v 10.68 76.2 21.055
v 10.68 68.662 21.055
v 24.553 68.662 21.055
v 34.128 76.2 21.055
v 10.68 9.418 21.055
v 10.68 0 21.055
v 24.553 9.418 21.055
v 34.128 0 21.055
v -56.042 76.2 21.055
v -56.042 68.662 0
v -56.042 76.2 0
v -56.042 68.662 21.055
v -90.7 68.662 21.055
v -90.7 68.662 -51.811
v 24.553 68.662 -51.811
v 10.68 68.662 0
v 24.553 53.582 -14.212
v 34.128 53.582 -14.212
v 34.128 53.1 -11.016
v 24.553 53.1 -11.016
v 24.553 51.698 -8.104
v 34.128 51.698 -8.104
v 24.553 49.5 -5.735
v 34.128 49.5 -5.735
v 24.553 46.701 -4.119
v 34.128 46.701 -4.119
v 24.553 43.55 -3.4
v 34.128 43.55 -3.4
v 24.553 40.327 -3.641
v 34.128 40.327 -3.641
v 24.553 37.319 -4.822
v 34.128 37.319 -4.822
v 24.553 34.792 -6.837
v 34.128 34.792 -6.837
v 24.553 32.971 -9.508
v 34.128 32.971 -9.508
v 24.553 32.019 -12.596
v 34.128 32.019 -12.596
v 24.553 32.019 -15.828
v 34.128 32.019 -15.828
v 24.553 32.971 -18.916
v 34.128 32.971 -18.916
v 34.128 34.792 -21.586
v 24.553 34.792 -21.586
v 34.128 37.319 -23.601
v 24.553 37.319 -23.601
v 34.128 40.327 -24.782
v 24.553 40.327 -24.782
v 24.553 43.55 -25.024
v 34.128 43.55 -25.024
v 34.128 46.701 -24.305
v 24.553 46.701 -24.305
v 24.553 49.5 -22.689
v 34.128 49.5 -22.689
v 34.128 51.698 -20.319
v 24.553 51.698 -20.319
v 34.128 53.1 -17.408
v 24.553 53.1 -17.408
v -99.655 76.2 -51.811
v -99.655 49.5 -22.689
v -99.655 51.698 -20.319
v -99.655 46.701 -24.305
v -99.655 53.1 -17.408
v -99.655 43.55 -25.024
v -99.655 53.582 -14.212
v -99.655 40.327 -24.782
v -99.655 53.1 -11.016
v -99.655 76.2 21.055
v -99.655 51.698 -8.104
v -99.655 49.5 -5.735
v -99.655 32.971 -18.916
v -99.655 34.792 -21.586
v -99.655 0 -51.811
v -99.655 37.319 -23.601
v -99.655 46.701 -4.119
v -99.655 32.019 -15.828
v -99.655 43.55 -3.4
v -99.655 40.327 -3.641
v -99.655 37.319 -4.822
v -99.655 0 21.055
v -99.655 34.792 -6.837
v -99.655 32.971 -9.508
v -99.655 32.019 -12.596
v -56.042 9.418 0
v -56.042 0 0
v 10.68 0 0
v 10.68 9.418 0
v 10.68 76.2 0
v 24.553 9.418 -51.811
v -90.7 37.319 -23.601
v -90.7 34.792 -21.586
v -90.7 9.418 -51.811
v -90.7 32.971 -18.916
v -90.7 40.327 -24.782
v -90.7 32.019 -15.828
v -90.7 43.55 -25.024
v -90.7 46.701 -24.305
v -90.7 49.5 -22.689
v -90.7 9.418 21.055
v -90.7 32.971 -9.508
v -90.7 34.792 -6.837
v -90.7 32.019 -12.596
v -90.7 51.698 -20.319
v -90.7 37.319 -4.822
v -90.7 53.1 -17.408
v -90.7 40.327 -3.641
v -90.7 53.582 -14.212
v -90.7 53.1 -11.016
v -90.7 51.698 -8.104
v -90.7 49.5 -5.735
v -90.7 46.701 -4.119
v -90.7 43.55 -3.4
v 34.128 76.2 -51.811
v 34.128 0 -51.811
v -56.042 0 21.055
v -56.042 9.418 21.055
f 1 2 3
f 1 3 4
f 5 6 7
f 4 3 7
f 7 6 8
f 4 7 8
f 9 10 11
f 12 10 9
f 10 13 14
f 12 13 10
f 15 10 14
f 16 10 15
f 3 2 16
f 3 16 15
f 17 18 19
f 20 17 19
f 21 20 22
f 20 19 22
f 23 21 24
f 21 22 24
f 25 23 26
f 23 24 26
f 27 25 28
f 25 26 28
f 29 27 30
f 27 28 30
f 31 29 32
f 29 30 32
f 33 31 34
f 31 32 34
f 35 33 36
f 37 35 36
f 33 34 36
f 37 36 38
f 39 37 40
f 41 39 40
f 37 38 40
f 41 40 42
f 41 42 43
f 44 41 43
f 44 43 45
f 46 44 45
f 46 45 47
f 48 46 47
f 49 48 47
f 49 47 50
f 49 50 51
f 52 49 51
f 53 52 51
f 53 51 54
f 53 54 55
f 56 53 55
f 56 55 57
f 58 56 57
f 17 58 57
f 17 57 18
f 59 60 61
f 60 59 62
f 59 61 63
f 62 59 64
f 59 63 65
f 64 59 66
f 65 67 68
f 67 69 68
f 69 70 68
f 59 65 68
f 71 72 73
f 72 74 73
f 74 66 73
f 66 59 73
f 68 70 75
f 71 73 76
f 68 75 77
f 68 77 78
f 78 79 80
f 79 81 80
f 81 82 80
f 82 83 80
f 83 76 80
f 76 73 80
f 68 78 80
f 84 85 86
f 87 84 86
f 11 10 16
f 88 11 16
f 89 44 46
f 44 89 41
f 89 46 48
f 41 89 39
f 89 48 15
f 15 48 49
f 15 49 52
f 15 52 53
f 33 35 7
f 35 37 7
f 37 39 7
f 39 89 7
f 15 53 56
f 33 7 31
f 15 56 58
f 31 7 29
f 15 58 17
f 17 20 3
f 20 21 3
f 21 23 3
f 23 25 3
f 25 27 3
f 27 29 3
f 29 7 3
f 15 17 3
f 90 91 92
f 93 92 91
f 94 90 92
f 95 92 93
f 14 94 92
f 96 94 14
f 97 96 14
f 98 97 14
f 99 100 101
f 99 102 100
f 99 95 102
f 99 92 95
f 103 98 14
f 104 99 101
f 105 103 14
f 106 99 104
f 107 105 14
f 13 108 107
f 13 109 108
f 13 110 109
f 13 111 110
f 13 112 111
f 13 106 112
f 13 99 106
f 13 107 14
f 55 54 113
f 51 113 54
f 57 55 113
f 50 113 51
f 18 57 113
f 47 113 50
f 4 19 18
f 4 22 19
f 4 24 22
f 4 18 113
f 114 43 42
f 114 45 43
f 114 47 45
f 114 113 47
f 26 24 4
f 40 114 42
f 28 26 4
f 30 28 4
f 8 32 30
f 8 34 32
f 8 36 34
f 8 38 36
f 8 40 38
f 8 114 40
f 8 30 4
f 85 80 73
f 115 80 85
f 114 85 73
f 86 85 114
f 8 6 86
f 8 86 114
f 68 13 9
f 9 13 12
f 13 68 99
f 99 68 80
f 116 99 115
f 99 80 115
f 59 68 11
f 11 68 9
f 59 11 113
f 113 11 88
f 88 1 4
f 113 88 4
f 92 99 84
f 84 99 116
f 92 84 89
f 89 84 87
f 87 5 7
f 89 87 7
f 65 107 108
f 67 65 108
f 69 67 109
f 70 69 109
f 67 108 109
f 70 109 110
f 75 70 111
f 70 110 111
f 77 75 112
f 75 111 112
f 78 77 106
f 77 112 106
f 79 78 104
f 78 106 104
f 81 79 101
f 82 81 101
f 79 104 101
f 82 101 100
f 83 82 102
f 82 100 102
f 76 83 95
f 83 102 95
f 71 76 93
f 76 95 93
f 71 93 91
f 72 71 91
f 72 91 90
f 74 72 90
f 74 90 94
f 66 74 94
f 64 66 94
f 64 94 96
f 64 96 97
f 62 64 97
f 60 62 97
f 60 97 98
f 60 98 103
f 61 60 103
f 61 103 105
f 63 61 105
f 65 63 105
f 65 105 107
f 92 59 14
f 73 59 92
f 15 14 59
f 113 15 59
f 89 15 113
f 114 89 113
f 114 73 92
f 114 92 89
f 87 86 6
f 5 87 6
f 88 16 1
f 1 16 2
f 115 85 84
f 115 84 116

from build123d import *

# Parameters (mm, degrees)
F0_W     = 133.7834484875
F0_H     = 72.8662703186
F1_DEPTH = 76.2
F2_W     = 115.2523923665
F2_H     = 59.2436287552
F3_DEPTH = 72.8672703186
F4_R     = 10.8422221272
F5_DEPTH = 133.7844484875
F6_W     = 66.7222347111
F6_H     = 33.3499126136
F7_DEPTH = 76.201


with BuildPart() as f1:
    # F0 (on Front) → F1 (new body)
    with BuildSketch(Plane.XZ):
        with Locations((-32.7633004636, -15.3782842681)):
            Rectangle(F0_W, F0_H)
    extrude(amount=-F1_DEPTH)

    # F2 (on face) → F3 (cut, through all)
    with BuildSketch(Plane.XY.offset(21.0548508912)):
        with Locations((-33.0736329779, 39.0397785231)):
            Rectangle(F2_W, F2_H)
    extrude(amount=-F3_DEPTH, mode=Mode.SUBTRACT)

    # F4 (on face) → F5 (cut, through all)
    with BuildSketch(Plane.YZ.offset(34.1284237802)):
        with Locations((42.7399463952, -14.2118474469)):
            Circle(F4_R)
    extrude(amount=-F5_DEPTH, mode=Mode.SUBTRACT)

    # F6 (on face) → F7 (cut, through all)
    with BuildSketch(Plane.XZ):
        with Locations((-22.6808311418, 16.6749563068)):
            Rectangle(F6_W, F6_H)
    extrude(amount=-F7_DEPTH, mode=Mode.SUBTRACT)


solid = f1.part
